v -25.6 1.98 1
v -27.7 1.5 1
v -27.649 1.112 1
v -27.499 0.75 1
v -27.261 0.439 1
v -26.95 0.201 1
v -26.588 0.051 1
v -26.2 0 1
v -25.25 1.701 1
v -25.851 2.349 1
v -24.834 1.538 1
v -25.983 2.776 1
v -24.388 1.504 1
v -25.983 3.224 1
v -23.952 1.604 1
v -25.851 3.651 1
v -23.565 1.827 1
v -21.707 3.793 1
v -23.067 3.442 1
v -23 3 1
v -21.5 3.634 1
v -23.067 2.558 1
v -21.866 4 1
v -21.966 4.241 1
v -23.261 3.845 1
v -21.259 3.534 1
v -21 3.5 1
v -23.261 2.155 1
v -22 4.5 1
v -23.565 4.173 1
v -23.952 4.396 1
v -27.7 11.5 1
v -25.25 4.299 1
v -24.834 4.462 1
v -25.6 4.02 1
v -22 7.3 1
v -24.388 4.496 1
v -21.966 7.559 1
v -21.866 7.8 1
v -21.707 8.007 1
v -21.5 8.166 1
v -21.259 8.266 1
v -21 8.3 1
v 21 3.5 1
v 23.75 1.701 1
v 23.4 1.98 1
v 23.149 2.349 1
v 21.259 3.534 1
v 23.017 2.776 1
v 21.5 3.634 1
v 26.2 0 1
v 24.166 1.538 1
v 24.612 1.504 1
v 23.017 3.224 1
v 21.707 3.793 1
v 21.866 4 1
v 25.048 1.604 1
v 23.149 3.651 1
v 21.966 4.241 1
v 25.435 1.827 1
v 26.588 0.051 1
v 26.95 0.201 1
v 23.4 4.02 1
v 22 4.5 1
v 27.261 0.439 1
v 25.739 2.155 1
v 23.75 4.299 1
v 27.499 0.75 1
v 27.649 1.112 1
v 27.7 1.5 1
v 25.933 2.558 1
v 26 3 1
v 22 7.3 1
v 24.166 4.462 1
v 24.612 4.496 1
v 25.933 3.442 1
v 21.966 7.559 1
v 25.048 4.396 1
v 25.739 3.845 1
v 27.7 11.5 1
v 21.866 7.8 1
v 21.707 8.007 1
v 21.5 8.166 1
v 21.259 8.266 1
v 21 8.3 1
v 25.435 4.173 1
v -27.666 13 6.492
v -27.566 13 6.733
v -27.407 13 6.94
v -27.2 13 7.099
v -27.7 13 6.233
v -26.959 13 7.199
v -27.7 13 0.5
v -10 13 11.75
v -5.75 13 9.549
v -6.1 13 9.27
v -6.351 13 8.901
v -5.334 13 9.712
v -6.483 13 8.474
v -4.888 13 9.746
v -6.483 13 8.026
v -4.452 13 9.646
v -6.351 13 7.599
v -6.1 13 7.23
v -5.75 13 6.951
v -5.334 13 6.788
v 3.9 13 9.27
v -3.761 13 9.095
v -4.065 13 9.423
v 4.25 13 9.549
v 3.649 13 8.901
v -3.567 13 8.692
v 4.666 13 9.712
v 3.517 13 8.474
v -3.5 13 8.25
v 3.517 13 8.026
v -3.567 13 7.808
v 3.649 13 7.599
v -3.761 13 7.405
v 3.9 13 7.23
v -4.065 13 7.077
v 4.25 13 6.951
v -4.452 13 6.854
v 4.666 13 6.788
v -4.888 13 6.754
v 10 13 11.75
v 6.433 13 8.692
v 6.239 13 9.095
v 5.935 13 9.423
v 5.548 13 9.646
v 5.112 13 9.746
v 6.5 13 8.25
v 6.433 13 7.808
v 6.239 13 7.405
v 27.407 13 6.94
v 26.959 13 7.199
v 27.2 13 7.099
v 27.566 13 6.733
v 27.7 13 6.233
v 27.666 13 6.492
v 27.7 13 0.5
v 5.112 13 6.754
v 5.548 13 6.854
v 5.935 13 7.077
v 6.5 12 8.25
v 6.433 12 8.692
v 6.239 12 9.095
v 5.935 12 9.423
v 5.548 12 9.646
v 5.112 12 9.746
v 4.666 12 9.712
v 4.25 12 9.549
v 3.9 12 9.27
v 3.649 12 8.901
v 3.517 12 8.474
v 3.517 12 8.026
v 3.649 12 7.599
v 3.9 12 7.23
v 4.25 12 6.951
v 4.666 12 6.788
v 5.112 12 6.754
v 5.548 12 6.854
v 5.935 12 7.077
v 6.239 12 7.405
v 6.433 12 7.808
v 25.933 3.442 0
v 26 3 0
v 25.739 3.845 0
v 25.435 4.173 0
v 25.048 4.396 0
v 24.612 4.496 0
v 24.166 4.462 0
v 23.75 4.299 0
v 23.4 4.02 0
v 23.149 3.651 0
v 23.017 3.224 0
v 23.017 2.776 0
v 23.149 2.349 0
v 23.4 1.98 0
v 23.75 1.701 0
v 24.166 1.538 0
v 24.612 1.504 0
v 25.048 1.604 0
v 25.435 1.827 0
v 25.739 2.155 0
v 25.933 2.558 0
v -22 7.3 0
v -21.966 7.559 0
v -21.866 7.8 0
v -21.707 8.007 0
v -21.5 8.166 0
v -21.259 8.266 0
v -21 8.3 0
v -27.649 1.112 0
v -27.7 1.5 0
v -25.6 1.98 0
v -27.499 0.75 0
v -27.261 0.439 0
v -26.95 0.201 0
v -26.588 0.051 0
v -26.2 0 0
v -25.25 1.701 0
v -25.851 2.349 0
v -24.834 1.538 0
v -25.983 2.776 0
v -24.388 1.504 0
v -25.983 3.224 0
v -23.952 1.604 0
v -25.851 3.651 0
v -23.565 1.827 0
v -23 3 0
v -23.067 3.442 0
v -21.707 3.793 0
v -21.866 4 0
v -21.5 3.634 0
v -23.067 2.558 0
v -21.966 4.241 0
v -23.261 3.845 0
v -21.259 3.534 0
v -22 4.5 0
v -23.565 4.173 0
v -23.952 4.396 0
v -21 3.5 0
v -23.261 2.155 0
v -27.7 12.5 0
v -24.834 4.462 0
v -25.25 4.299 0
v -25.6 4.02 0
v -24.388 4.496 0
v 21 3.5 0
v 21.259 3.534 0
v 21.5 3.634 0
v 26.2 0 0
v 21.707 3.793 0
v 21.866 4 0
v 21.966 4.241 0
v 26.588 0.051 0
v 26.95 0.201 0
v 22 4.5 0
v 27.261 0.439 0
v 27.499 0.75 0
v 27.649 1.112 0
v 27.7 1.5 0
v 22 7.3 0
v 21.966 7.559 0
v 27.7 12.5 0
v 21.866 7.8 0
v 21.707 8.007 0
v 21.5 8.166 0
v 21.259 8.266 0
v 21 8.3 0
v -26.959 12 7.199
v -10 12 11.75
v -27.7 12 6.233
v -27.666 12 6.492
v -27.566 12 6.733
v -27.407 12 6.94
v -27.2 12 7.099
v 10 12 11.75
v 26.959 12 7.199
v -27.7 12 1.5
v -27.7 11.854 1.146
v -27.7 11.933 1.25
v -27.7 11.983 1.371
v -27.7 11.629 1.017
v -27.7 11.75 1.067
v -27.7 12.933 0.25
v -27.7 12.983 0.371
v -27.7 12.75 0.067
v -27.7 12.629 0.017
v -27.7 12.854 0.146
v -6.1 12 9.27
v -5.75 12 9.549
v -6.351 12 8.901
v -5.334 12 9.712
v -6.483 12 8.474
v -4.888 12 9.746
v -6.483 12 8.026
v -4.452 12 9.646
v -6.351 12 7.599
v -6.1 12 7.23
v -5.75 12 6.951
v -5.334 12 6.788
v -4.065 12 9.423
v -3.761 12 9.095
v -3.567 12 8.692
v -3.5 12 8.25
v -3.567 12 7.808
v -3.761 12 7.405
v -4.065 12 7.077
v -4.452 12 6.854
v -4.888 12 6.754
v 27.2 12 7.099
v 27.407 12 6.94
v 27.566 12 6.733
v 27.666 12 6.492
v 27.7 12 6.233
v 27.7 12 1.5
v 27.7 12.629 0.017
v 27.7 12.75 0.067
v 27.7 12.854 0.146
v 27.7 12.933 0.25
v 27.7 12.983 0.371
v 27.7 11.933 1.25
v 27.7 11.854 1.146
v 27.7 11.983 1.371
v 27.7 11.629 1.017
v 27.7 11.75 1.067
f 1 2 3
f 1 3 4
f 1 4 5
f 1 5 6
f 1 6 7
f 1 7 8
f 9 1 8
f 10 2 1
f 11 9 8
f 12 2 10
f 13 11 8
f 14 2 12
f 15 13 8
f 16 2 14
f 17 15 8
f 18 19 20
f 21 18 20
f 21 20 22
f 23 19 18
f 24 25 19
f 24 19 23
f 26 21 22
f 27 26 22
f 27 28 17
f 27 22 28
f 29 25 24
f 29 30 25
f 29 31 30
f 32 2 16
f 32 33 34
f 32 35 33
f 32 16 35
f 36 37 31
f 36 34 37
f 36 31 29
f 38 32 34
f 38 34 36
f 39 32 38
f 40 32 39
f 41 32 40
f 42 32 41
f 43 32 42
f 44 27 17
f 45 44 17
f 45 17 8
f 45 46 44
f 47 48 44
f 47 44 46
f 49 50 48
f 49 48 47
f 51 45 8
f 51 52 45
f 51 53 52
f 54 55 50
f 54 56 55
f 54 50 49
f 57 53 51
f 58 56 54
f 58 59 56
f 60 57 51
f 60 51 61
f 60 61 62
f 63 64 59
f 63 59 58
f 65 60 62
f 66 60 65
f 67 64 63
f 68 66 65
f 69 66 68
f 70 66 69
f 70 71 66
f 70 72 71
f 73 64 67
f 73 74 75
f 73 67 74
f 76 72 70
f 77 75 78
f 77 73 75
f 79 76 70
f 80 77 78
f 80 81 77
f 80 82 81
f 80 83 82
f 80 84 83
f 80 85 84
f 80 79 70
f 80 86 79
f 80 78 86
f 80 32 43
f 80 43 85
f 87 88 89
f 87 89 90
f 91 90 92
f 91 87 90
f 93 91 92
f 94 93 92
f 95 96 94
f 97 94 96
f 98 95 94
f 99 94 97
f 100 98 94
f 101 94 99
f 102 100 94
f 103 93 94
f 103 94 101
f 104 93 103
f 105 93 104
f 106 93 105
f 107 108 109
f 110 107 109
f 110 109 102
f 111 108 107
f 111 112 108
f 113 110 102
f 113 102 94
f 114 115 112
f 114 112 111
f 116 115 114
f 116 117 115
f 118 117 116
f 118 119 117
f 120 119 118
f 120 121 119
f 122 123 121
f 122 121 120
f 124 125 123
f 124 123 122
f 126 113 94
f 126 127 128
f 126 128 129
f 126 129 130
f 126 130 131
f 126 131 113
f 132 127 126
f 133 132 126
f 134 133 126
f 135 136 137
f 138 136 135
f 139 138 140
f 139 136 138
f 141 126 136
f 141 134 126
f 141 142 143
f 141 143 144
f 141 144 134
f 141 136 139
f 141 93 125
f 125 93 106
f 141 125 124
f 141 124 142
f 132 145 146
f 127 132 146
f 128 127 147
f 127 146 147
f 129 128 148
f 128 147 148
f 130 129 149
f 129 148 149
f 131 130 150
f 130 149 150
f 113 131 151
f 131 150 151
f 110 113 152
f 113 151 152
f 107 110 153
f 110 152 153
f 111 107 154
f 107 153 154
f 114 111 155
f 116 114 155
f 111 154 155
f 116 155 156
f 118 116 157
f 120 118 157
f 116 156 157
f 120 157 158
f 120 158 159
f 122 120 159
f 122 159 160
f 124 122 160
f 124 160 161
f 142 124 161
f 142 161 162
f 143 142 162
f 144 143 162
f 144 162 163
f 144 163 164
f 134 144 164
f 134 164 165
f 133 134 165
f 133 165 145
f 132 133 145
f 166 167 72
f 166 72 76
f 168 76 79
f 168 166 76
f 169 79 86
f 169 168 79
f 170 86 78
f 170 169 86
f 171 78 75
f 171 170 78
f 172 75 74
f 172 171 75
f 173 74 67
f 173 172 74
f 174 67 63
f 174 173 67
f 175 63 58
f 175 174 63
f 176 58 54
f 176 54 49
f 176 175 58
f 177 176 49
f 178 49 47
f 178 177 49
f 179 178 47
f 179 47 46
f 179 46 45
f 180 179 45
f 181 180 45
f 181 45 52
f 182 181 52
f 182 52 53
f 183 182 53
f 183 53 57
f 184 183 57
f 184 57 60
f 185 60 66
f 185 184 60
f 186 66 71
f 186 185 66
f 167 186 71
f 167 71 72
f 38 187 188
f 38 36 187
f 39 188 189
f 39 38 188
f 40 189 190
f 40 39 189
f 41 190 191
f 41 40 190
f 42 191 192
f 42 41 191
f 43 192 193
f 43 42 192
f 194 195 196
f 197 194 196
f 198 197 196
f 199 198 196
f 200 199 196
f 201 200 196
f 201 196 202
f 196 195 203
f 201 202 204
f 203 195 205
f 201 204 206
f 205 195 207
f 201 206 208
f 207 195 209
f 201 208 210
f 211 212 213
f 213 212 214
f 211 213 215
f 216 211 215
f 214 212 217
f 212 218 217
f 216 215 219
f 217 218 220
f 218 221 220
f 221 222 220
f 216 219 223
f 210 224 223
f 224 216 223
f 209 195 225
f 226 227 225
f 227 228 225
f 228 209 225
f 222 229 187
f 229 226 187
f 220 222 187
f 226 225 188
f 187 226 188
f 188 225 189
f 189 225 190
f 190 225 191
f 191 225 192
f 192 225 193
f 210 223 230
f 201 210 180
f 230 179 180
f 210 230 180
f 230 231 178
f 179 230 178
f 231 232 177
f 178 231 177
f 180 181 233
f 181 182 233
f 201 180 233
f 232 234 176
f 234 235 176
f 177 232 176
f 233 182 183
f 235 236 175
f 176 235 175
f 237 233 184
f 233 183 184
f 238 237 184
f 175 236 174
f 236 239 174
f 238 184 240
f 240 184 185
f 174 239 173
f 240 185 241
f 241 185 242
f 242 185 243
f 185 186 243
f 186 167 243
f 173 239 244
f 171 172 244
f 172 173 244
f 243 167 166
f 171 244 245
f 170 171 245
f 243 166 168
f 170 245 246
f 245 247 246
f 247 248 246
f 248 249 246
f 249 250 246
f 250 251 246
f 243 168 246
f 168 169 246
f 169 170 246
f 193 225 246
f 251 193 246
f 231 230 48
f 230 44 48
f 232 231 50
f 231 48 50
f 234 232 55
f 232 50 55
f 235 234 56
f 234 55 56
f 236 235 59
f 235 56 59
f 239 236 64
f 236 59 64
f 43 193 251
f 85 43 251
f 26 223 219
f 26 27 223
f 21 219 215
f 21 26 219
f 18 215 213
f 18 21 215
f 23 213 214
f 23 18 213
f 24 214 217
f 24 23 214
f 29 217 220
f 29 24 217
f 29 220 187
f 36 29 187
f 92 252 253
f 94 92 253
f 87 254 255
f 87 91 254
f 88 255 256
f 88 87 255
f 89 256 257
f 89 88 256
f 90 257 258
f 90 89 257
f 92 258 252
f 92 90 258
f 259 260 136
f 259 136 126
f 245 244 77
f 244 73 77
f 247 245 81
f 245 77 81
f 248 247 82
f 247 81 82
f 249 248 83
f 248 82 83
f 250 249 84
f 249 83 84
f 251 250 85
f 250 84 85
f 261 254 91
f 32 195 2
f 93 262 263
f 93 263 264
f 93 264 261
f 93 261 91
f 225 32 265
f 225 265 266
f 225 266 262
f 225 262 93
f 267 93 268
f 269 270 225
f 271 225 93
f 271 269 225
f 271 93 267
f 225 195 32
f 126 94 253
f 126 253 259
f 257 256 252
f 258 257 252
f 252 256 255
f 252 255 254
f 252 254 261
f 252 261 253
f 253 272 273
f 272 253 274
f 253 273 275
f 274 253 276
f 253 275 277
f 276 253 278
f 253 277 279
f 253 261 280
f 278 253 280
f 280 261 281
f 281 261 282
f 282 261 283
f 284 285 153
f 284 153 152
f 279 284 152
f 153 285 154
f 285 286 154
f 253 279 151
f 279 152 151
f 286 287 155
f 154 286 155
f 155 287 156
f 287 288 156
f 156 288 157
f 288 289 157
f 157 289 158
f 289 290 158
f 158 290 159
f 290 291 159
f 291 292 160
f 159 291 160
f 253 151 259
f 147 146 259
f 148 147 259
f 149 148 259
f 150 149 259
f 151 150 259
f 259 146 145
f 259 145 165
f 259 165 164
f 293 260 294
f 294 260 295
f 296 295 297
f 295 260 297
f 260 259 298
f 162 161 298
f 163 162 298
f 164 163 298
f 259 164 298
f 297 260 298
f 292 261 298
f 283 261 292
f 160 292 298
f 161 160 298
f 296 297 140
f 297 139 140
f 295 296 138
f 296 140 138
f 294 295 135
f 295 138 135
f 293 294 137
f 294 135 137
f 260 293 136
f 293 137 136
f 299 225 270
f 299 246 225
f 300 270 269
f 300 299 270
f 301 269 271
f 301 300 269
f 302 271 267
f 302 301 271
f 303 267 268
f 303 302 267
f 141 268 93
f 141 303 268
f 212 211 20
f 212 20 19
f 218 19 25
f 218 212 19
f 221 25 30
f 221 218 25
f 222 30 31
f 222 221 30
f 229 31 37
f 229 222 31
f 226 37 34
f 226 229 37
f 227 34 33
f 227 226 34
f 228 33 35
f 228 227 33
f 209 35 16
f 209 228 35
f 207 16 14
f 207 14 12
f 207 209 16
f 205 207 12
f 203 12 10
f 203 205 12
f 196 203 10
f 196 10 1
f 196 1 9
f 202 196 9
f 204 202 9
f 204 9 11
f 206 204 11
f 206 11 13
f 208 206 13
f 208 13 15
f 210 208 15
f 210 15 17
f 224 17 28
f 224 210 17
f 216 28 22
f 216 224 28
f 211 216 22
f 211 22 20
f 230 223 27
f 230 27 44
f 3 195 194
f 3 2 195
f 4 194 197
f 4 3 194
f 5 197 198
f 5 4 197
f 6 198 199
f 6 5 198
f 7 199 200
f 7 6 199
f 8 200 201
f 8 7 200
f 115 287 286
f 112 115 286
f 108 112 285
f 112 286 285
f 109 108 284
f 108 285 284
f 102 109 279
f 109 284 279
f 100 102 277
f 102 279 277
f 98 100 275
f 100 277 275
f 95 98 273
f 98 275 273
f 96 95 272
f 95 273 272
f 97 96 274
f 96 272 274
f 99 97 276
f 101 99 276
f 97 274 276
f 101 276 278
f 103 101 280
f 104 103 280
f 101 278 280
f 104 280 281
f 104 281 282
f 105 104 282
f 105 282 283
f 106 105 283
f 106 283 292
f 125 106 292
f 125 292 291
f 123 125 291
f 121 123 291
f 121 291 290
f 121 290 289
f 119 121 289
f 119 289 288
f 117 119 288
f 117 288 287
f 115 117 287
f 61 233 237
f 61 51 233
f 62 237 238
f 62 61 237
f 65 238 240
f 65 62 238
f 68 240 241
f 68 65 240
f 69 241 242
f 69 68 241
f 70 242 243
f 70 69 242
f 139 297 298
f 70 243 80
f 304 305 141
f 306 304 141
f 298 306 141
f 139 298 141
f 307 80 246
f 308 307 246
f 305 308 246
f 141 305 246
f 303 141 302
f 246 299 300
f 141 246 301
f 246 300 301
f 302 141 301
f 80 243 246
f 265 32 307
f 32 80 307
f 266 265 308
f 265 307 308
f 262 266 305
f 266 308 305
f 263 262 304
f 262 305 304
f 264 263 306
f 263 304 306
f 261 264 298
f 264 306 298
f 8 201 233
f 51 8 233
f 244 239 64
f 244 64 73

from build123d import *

# Parameters (mm, degrees)
SKETCH_1_W          = 55.4
SKETCH_1_H          = 13
SKETCH_1_R          = 1.5
SKETCH_1_W_2        = 44
SKETCH_1_H_2        = 4.8
EXTRUDE_1_DEPTH     = 1
SKETCH_2_W          = 55.4
SKETCH_2_H          = 1
EXTRUDE_2_DEPTH     = 10.75
CUT_EXTRUDE_1_DEPTH = 2
SKETCH_4_R          = 1.5
CUT_EXTRUDE_2_DEPTH = 2
FILLET_1_R          = 0.5
FILLET_2_R          = 1
FILLET_3_R          = 1.5
FILLET_4_R          = 1


with BuildPart() as part:
    # 草图1 → 凸台-拉伸1 (new body)
    with BuildSketch(Plane.XY):
        with Locations((0, 6.5)):
            Rectangle(SKETCH_1_W, SKETCH_1_H)
        with Locations((-24.5, 3)):
            Circle(SKETCH_1_R, mode=Mode.SUBTRACT)
        with Locations((24.5, 3)):
            Circle(SKETCH_1_R, mode=Mode.SUBTRACT)
        with Locations((0, 5.9)):
            Rectangle(SKETCH_1_W_2, SKETCH_1_H_2, mode=Mode.SUBTRACT)
    extrude(amount=EXTRUDE_1_DEPTH)

    # 草图2 → 凸台-拉伸2 (add)
    with BuildSketch(Plane.XY.offset(1)):
        with Locations((0, 12.5)):
            Rectangle(SKETCH_2_W, SKETCH_2_H)
    extrude(amount=EXTRUDE_2_DEPTH)

    # 草图3 → 切除-拉伸1 (cut, through all)
    with BuildSketch(Plane.XZ.offset(-12)):
        Polygon((-27.7, 11.75), (-27.7, 7), (-10, 11.75), align=None)
        Polygon((27.7, 11.75), (27.7, 7), (10, 11.75), align=None)
    extrude(amount=-CUT_EXTRUDE_1_DEPTH, mode=Mode.SUBTRACT)

    # 草图4 → 切除-拉伸2 (cut, through all)
    with BuildSketch(Plane.XZ.offset(-12)):
        with Locations((-5, 8.25)):
            Circle(SKETCH_4_R)
        with Locations((5, 8.25)):
            Circle(SKETCH_4_R)
    extrude(amount=-CUT_EXTRUDE_2_DEPTH, mode=Mode.SUBTRACT)

    # 圆角1
    fillet_1_edges = [part.edges().sort_by_distance(p)[0] for p in [
        (0, 13, 0),
        (0, 12, 1),
    ]]
    fillet(fillet_1_edges, radius=FILLET_1_R)

    # 圆角2
    fillet_2_edges = [part.edges().sort_by_distance(p)[0] for p in [
        (22, 3.5, 0.5),
        (22, 8.3, 0.5),
        (-22, 8.3, 0.5),
        (-22, 3.5, 0.5),
    ]]
    fillet(fillet_2_edges, radius=FILLET_2_R)

    # 圆角3
    fillet_3_edges = [part.edges().sort_by_distance(p)[0] for p in [
        (27.7, 0, 0.5),
        (-27.7, 0, 0.5),
    ]]
    fillet(fillet_3_edges, radius=FILLET_3_R)

    # 圆角4
    fillet_4_edges = [part.edges().sort_by_distance(p)[0] for p in [
        (-27.7, 12.5, 7),
        (27.7, 12.5, 7),
    ]]
    fillet(fillet_4_edges, radius=FILLET_4_R)


solid = part.part
